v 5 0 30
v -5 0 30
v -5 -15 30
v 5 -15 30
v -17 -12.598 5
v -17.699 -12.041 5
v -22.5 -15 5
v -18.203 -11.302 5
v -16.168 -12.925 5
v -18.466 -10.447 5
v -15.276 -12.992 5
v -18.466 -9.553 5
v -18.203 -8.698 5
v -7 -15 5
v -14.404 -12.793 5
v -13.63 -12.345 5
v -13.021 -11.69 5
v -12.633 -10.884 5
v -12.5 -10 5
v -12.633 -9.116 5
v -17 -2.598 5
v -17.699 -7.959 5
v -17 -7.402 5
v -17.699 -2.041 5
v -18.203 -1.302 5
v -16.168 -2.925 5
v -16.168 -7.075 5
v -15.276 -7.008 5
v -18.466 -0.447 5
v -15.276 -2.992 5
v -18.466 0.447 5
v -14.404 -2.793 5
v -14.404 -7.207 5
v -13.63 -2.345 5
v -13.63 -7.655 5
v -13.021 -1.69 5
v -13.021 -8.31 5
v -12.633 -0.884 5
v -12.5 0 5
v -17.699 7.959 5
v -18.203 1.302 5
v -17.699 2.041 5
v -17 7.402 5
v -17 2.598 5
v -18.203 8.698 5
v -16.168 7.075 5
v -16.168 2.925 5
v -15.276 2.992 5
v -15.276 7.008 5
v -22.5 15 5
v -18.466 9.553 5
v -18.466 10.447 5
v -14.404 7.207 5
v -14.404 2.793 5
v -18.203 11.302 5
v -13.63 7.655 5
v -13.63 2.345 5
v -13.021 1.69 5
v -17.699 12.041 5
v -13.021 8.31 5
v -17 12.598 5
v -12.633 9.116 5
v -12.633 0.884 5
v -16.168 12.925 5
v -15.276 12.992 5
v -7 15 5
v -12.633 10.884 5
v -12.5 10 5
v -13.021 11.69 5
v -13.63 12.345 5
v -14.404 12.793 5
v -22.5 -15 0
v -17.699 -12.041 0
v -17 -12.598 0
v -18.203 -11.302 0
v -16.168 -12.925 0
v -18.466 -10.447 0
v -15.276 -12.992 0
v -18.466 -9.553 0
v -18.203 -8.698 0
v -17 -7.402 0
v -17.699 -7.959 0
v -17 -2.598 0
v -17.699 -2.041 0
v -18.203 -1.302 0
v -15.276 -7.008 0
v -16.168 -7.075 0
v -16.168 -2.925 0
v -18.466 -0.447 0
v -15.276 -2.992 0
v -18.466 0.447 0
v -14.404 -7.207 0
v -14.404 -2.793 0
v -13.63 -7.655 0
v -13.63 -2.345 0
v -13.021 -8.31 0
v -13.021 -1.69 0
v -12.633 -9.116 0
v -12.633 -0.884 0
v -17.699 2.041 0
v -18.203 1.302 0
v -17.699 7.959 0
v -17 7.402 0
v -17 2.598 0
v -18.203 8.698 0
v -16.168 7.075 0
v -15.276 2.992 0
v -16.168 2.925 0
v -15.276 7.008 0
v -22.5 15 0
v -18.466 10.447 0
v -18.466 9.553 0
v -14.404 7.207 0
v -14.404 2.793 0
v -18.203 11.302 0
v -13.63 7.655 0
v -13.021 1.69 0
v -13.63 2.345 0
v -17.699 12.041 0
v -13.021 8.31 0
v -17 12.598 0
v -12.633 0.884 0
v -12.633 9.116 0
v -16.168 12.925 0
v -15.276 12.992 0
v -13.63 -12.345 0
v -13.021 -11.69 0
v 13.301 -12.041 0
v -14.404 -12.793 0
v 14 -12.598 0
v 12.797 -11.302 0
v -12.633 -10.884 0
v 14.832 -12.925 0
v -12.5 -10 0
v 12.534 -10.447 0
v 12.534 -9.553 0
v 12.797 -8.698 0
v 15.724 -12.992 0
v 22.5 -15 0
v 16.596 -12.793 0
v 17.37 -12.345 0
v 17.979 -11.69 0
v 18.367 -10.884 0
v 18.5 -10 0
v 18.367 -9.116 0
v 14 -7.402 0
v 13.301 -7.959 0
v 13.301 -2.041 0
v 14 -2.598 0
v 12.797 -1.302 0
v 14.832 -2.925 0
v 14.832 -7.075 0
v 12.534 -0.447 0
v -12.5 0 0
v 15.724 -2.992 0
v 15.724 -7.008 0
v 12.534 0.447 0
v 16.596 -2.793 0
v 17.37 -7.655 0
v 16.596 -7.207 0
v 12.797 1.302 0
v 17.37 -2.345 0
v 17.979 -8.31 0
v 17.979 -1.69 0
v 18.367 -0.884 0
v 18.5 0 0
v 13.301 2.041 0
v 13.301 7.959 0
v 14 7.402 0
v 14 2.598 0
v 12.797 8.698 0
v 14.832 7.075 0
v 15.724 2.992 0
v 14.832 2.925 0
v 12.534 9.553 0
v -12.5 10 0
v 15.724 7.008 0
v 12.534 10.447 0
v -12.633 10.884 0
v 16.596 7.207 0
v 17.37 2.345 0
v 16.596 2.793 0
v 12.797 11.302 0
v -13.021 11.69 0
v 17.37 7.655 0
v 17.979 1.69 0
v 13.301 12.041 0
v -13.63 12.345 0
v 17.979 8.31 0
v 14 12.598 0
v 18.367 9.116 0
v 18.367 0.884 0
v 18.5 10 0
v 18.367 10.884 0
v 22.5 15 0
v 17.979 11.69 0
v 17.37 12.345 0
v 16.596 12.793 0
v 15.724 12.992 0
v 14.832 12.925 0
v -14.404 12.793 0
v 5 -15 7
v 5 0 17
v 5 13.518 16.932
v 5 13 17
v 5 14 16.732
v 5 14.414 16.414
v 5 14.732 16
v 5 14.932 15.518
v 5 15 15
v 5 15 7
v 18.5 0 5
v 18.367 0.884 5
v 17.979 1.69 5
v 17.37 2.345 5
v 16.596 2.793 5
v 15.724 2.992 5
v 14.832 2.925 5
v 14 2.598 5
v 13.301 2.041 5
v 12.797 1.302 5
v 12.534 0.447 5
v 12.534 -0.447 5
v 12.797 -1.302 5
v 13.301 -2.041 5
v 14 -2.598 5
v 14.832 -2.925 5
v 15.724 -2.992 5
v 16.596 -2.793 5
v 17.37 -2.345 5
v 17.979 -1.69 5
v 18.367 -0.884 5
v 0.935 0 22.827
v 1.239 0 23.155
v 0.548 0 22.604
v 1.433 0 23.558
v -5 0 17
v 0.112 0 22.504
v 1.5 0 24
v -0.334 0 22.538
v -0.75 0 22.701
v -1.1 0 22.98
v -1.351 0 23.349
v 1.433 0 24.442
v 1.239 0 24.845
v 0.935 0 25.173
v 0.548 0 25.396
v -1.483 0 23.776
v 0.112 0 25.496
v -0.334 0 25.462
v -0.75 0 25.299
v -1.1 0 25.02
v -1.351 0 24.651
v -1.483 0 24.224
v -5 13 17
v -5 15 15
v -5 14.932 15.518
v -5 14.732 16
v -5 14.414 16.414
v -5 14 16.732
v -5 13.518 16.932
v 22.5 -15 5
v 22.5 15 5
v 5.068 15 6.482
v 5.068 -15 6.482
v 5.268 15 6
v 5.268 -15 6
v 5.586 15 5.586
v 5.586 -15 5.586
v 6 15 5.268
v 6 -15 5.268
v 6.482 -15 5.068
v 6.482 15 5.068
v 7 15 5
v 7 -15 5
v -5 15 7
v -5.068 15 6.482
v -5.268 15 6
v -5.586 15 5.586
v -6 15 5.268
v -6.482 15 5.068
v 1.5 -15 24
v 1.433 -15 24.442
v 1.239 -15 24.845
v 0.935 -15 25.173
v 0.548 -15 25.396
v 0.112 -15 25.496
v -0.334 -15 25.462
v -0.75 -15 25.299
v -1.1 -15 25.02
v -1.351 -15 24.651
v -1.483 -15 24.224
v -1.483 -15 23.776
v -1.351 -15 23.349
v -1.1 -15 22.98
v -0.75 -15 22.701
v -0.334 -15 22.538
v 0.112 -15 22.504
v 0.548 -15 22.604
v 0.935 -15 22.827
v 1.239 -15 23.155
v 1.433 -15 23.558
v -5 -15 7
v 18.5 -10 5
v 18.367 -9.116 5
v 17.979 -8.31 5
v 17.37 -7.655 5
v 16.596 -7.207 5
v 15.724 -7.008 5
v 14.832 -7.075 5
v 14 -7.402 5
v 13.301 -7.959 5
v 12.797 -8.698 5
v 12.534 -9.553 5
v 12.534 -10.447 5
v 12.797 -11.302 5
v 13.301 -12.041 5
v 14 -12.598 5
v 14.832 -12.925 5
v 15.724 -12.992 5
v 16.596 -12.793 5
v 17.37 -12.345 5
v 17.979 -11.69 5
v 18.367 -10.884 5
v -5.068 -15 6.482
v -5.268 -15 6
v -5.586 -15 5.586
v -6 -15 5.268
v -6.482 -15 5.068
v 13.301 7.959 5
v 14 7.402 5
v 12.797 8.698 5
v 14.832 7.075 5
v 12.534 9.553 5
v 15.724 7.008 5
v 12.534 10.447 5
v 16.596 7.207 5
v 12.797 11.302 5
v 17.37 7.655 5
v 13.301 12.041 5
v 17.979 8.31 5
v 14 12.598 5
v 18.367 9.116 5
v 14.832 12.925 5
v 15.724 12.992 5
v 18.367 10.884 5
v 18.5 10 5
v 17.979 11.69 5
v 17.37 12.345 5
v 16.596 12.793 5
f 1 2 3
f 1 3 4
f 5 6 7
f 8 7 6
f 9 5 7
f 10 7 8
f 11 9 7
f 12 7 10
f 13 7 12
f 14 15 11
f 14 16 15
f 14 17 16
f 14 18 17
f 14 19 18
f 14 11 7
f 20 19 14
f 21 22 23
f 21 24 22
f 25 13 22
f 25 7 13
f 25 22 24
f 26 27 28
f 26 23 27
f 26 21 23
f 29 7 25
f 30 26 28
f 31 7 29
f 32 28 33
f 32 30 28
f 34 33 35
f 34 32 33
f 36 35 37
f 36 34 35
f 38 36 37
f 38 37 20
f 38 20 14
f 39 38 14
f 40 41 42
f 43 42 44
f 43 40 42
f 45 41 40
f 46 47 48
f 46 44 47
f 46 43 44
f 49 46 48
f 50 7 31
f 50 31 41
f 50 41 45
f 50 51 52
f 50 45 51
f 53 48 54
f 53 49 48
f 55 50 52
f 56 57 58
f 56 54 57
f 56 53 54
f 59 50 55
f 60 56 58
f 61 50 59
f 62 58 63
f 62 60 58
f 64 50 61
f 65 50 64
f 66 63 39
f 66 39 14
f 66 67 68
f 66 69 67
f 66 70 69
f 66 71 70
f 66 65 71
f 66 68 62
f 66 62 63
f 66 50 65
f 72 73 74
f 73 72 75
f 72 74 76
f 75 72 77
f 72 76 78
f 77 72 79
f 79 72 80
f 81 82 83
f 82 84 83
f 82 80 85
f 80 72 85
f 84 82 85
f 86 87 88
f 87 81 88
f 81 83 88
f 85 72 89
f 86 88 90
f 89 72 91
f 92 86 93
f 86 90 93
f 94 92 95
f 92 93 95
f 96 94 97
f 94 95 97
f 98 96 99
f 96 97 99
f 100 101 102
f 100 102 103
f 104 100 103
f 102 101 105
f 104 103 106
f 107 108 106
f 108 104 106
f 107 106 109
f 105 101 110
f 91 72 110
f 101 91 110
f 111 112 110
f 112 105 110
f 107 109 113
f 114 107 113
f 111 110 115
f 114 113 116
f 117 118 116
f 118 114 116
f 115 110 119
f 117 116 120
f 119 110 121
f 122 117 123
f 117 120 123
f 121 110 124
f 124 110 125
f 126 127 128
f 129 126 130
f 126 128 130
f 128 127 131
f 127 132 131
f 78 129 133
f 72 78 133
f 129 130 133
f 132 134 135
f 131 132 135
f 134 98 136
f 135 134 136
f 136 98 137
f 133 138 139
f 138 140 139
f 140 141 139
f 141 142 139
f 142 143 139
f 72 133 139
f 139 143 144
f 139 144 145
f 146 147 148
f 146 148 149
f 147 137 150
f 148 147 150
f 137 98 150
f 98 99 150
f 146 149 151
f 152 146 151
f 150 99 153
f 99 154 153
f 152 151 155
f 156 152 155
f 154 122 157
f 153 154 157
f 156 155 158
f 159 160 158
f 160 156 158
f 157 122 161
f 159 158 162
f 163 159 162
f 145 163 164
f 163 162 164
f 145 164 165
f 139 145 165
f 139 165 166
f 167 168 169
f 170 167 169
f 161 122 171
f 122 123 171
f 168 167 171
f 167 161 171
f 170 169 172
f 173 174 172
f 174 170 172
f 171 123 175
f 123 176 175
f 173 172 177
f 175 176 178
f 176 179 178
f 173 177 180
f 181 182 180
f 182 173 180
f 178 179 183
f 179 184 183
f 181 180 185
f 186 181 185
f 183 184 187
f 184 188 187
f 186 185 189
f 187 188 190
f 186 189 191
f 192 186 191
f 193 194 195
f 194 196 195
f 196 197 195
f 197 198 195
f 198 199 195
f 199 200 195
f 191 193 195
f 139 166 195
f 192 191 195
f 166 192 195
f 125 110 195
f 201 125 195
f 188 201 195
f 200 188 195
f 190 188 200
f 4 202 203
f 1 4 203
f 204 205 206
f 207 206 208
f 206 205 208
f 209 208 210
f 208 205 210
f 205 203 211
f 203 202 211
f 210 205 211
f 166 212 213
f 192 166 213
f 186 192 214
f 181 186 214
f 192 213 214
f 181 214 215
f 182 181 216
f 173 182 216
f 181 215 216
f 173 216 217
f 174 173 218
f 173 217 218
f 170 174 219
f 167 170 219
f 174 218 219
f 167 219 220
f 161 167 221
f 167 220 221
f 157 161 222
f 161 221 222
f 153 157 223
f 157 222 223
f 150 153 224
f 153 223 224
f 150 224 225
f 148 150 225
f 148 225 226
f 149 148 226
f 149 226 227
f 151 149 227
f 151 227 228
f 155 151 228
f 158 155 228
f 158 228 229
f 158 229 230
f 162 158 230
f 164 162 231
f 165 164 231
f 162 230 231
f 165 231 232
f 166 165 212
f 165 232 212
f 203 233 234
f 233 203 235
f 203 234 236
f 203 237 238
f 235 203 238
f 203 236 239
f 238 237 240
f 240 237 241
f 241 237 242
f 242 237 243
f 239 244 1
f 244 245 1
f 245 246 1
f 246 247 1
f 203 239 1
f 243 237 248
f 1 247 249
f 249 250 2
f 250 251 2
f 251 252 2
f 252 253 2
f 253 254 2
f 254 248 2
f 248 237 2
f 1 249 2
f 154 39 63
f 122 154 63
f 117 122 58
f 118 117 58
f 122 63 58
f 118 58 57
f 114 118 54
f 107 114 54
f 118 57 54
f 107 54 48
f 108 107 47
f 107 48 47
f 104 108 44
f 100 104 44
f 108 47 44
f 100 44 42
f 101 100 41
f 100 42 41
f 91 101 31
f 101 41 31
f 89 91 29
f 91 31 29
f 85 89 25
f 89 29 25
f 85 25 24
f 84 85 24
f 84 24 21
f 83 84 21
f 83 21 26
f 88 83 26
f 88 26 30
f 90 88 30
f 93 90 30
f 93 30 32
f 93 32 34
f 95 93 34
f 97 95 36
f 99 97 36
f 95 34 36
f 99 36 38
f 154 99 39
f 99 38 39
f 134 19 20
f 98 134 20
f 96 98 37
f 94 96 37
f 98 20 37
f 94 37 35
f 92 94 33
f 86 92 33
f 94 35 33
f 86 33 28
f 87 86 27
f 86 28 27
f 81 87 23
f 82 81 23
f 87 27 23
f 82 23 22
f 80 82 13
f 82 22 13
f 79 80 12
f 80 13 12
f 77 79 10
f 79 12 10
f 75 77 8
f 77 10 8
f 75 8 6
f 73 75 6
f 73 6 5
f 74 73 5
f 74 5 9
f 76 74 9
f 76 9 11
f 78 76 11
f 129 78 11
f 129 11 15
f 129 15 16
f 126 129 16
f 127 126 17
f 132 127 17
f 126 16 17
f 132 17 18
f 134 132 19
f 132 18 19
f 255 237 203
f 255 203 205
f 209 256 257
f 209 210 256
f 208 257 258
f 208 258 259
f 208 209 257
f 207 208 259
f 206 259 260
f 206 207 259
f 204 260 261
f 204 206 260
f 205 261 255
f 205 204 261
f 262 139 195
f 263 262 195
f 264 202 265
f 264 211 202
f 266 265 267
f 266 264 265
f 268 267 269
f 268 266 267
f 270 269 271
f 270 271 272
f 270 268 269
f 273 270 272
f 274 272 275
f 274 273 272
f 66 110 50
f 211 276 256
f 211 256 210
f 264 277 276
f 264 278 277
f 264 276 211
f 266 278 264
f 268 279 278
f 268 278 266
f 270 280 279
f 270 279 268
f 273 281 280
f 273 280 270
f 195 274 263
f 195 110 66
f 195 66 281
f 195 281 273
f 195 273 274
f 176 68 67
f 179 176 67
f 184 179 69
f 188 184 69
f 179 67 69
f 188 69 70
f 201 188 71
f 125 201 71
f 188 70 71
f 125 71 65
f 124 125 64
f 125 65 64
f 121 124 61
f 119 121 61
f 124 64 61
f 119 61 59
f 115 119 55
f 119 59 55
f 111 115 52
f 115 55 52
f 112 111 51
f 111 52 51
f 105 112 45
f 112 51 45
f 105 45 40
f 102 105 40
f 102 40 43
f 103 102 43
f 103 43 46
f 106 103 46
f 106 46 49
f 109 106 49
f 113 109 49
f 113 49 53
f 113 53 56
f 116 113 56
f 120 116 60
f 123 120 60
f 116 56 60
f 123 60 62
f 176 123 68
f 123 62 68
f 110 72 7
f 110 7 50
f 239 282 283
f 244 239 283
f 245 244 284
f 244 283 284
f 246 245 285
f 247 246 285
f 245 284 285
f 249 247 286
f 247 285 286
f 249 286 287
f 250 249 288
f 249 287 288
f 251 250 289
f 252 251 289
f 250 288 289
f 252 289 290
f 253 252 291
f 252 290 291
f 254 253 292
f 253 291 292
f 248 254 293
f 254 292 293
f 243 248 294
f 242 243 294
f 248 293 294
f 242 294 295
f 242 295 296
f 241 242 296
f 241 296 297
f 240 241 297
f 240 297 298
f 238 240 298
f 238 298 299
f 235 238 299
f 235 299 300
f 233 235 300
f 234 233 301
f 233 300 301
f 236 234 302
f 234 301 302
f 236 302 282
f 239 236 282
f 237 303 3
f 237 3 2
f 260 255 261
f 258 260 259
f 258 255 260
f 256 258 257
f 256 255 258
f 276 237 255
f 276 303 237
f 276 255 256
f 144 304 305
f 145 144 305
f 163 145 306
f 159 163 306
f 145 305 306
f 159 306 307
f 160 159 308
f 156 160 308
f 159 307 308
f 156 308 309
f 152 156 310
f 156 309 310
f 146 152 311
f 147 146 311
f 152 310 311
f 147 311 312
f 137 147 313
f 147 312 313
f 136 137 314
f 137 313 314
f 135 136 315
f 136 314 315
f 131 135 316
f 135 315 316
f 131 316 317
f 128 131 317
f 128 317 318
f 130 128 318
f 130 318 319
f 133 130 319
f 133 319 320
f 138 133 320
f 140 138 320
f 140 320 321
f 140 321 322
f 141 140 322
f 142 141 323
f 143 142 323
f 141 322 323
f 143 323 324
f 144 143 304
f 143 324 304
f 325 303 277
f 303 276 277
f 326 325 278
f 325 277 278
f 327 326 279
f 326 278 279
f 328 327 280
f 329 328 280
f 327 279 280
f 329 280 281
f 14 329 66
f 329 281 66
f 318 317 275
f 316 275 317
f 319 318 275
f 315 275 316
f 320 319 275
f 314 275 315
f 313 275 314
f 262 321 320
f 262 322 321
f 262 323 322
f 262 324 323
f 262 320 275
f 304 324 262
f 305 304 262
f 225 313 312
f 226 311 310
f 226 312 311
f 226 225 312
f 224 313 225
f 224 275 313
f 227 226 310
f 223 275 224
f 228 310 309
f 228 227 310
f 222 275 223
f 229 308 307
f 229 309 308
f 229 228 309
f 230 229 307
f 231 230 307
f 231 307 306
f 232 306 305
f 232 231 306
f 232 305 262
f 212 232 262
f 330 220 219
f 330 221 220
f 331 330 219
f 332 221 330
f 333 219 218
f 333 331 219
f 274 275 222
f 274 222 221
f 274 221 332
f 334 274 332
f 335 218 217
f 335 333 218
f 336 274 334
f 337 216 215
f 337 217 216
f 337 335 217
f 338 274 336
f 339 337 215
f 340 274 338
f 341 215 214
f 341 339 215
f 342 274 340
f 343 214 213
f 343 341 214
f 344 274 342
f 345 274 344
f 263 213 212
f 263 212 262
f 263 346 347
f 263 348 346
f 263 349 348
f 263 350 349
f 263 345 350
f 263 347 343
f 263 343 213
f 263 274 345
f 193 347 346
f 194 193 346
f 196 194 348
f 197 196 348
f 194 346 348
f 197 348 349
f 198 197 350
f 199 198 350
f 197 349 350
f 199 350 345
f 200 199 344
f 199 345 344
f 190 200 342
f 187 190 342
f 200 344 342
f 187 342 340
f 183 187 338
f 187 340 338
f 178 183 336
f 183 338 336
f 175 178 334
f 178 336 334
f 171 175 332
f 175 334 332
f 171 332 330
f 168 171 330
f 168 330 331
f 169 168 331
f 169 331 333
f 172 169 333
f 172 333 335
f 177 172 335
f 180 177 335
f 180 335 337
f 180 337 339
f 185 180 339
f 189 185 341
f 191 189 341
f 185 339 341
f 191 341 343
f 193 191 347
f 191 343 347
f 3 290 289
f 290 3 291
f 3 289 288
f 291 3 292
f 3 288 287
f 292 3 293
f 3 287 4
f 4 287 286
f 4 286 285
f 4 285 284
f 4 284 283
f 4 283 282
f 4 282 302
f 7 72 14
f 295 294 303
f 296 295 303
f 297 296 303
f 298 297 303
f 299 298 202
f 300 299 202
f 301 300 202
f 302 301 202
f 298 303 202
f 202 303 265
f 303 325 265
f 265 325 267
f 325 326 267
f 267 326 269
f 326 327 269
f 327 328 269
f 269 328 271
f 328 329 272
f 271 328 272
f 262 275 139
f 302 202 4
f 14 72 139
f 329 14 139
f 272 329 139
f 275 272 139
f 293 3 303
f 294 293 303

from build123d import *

# Parameters (mm, degrees)
SKETCH1_W           = 45
SKETCH1_H           = 30
BASE_DEPTH          = 5
SKETCH2_W           = 10
SKETCH2_H           = 30
BOSS_EXTRUDE2_DEPTH = 25
SKETCH5_R           = 1.5
CABLE_HOLE_DEPTH    = 15
SKETCH9_R           = 3
SCREW_DEPTH         = 5
SKETCH10_W          = 15
SKETCH10_H          = 20
CUT_EXTRUDE8_DEPTH  = 10
FILLET5_R           = 2
FILLET6_R           = 2
FILLET7_R           = 2


with BuildPart() as part:
    # Sketch1 → Base (new body)
    with BuildSketch(Plane.XY):
        Rectangle(SKETCH1_W, SKETCH1_H)
    extrude(amount=BASE_DEPTH)

    # Sketch2 → Boss-Extrude2 (add)
    with BuildSketch(Plane.XY.offset(5)):
        Rectangle(SKETCH2_W, SKETCH2_H)
    extrude(amount=BOSS_EXTRUDE2_DEPTH)

    # Sketch5 → Cable hole (cut)
    with BuildSketch(Plane.XZ.offset(15)):
        with Locations((0, 24)):
            Circle(SKETCH5_R)
    extrude(amount=-CABLE_HOLE_DEPTH, mode=Mode.SUBTRACT)

    # Sketch9 → Screw (cut)
    with BuildSketch(Plane.XY.offset(5)):
        with Locations((-15.5, 10)):
            Circle(SKETCH9_R)
        with Locations((-15.5, 0)):
            Circle(SKETCH9_R)
        with Locations((-15.5, -10)):
            Circle(SKETCH9_R)
        with Locations((15.5, -10)):
            Circle(SKETCH9_R)
        with Locations((15.5, 0)):
            Circle(SKETCH9_R)
        with Locations((15.5, 10)):
            Circle(SKETCH9_R)
    extrude(amount=-SCREW_DEPTH, mode=Mode.SUBTRACT)

    # Sketch10 → Cut-Extrude8 (cut)
    with BuildSketch(Plane.ZY.offset(5)):
        with Locations((24.5, 10)):
            Rectangle(SKETCH10_W, SKETCH10_H)
    extrude(amount=-CUT_EXTRUDE8_DEPTH, mode=Mode.SUBTRACT)

    # Fillet5
    fillet5_edges = [part.edges().sort_by_distance(p)[0] for p in [
        (0, 15, 17),
    ]]
    fillet(fillet5_edges, radius=FILLET5_R)

    # Fillet6
    fillet6_edges = [part.edges().sort_by_distance(p)[0] for p in [
        (-5, 0, 5),
    ]]
    fillet(fillet6_edges, radius=FILLET6_R)

    # Fillet7
    fillet7_edges = [part.edges().sort_by_distance(p)[0] for p in [
        (5, 0, 5),
    ]]
    fillet(fillet7_edges, radius=FILLET7_R)


solid = part.part
